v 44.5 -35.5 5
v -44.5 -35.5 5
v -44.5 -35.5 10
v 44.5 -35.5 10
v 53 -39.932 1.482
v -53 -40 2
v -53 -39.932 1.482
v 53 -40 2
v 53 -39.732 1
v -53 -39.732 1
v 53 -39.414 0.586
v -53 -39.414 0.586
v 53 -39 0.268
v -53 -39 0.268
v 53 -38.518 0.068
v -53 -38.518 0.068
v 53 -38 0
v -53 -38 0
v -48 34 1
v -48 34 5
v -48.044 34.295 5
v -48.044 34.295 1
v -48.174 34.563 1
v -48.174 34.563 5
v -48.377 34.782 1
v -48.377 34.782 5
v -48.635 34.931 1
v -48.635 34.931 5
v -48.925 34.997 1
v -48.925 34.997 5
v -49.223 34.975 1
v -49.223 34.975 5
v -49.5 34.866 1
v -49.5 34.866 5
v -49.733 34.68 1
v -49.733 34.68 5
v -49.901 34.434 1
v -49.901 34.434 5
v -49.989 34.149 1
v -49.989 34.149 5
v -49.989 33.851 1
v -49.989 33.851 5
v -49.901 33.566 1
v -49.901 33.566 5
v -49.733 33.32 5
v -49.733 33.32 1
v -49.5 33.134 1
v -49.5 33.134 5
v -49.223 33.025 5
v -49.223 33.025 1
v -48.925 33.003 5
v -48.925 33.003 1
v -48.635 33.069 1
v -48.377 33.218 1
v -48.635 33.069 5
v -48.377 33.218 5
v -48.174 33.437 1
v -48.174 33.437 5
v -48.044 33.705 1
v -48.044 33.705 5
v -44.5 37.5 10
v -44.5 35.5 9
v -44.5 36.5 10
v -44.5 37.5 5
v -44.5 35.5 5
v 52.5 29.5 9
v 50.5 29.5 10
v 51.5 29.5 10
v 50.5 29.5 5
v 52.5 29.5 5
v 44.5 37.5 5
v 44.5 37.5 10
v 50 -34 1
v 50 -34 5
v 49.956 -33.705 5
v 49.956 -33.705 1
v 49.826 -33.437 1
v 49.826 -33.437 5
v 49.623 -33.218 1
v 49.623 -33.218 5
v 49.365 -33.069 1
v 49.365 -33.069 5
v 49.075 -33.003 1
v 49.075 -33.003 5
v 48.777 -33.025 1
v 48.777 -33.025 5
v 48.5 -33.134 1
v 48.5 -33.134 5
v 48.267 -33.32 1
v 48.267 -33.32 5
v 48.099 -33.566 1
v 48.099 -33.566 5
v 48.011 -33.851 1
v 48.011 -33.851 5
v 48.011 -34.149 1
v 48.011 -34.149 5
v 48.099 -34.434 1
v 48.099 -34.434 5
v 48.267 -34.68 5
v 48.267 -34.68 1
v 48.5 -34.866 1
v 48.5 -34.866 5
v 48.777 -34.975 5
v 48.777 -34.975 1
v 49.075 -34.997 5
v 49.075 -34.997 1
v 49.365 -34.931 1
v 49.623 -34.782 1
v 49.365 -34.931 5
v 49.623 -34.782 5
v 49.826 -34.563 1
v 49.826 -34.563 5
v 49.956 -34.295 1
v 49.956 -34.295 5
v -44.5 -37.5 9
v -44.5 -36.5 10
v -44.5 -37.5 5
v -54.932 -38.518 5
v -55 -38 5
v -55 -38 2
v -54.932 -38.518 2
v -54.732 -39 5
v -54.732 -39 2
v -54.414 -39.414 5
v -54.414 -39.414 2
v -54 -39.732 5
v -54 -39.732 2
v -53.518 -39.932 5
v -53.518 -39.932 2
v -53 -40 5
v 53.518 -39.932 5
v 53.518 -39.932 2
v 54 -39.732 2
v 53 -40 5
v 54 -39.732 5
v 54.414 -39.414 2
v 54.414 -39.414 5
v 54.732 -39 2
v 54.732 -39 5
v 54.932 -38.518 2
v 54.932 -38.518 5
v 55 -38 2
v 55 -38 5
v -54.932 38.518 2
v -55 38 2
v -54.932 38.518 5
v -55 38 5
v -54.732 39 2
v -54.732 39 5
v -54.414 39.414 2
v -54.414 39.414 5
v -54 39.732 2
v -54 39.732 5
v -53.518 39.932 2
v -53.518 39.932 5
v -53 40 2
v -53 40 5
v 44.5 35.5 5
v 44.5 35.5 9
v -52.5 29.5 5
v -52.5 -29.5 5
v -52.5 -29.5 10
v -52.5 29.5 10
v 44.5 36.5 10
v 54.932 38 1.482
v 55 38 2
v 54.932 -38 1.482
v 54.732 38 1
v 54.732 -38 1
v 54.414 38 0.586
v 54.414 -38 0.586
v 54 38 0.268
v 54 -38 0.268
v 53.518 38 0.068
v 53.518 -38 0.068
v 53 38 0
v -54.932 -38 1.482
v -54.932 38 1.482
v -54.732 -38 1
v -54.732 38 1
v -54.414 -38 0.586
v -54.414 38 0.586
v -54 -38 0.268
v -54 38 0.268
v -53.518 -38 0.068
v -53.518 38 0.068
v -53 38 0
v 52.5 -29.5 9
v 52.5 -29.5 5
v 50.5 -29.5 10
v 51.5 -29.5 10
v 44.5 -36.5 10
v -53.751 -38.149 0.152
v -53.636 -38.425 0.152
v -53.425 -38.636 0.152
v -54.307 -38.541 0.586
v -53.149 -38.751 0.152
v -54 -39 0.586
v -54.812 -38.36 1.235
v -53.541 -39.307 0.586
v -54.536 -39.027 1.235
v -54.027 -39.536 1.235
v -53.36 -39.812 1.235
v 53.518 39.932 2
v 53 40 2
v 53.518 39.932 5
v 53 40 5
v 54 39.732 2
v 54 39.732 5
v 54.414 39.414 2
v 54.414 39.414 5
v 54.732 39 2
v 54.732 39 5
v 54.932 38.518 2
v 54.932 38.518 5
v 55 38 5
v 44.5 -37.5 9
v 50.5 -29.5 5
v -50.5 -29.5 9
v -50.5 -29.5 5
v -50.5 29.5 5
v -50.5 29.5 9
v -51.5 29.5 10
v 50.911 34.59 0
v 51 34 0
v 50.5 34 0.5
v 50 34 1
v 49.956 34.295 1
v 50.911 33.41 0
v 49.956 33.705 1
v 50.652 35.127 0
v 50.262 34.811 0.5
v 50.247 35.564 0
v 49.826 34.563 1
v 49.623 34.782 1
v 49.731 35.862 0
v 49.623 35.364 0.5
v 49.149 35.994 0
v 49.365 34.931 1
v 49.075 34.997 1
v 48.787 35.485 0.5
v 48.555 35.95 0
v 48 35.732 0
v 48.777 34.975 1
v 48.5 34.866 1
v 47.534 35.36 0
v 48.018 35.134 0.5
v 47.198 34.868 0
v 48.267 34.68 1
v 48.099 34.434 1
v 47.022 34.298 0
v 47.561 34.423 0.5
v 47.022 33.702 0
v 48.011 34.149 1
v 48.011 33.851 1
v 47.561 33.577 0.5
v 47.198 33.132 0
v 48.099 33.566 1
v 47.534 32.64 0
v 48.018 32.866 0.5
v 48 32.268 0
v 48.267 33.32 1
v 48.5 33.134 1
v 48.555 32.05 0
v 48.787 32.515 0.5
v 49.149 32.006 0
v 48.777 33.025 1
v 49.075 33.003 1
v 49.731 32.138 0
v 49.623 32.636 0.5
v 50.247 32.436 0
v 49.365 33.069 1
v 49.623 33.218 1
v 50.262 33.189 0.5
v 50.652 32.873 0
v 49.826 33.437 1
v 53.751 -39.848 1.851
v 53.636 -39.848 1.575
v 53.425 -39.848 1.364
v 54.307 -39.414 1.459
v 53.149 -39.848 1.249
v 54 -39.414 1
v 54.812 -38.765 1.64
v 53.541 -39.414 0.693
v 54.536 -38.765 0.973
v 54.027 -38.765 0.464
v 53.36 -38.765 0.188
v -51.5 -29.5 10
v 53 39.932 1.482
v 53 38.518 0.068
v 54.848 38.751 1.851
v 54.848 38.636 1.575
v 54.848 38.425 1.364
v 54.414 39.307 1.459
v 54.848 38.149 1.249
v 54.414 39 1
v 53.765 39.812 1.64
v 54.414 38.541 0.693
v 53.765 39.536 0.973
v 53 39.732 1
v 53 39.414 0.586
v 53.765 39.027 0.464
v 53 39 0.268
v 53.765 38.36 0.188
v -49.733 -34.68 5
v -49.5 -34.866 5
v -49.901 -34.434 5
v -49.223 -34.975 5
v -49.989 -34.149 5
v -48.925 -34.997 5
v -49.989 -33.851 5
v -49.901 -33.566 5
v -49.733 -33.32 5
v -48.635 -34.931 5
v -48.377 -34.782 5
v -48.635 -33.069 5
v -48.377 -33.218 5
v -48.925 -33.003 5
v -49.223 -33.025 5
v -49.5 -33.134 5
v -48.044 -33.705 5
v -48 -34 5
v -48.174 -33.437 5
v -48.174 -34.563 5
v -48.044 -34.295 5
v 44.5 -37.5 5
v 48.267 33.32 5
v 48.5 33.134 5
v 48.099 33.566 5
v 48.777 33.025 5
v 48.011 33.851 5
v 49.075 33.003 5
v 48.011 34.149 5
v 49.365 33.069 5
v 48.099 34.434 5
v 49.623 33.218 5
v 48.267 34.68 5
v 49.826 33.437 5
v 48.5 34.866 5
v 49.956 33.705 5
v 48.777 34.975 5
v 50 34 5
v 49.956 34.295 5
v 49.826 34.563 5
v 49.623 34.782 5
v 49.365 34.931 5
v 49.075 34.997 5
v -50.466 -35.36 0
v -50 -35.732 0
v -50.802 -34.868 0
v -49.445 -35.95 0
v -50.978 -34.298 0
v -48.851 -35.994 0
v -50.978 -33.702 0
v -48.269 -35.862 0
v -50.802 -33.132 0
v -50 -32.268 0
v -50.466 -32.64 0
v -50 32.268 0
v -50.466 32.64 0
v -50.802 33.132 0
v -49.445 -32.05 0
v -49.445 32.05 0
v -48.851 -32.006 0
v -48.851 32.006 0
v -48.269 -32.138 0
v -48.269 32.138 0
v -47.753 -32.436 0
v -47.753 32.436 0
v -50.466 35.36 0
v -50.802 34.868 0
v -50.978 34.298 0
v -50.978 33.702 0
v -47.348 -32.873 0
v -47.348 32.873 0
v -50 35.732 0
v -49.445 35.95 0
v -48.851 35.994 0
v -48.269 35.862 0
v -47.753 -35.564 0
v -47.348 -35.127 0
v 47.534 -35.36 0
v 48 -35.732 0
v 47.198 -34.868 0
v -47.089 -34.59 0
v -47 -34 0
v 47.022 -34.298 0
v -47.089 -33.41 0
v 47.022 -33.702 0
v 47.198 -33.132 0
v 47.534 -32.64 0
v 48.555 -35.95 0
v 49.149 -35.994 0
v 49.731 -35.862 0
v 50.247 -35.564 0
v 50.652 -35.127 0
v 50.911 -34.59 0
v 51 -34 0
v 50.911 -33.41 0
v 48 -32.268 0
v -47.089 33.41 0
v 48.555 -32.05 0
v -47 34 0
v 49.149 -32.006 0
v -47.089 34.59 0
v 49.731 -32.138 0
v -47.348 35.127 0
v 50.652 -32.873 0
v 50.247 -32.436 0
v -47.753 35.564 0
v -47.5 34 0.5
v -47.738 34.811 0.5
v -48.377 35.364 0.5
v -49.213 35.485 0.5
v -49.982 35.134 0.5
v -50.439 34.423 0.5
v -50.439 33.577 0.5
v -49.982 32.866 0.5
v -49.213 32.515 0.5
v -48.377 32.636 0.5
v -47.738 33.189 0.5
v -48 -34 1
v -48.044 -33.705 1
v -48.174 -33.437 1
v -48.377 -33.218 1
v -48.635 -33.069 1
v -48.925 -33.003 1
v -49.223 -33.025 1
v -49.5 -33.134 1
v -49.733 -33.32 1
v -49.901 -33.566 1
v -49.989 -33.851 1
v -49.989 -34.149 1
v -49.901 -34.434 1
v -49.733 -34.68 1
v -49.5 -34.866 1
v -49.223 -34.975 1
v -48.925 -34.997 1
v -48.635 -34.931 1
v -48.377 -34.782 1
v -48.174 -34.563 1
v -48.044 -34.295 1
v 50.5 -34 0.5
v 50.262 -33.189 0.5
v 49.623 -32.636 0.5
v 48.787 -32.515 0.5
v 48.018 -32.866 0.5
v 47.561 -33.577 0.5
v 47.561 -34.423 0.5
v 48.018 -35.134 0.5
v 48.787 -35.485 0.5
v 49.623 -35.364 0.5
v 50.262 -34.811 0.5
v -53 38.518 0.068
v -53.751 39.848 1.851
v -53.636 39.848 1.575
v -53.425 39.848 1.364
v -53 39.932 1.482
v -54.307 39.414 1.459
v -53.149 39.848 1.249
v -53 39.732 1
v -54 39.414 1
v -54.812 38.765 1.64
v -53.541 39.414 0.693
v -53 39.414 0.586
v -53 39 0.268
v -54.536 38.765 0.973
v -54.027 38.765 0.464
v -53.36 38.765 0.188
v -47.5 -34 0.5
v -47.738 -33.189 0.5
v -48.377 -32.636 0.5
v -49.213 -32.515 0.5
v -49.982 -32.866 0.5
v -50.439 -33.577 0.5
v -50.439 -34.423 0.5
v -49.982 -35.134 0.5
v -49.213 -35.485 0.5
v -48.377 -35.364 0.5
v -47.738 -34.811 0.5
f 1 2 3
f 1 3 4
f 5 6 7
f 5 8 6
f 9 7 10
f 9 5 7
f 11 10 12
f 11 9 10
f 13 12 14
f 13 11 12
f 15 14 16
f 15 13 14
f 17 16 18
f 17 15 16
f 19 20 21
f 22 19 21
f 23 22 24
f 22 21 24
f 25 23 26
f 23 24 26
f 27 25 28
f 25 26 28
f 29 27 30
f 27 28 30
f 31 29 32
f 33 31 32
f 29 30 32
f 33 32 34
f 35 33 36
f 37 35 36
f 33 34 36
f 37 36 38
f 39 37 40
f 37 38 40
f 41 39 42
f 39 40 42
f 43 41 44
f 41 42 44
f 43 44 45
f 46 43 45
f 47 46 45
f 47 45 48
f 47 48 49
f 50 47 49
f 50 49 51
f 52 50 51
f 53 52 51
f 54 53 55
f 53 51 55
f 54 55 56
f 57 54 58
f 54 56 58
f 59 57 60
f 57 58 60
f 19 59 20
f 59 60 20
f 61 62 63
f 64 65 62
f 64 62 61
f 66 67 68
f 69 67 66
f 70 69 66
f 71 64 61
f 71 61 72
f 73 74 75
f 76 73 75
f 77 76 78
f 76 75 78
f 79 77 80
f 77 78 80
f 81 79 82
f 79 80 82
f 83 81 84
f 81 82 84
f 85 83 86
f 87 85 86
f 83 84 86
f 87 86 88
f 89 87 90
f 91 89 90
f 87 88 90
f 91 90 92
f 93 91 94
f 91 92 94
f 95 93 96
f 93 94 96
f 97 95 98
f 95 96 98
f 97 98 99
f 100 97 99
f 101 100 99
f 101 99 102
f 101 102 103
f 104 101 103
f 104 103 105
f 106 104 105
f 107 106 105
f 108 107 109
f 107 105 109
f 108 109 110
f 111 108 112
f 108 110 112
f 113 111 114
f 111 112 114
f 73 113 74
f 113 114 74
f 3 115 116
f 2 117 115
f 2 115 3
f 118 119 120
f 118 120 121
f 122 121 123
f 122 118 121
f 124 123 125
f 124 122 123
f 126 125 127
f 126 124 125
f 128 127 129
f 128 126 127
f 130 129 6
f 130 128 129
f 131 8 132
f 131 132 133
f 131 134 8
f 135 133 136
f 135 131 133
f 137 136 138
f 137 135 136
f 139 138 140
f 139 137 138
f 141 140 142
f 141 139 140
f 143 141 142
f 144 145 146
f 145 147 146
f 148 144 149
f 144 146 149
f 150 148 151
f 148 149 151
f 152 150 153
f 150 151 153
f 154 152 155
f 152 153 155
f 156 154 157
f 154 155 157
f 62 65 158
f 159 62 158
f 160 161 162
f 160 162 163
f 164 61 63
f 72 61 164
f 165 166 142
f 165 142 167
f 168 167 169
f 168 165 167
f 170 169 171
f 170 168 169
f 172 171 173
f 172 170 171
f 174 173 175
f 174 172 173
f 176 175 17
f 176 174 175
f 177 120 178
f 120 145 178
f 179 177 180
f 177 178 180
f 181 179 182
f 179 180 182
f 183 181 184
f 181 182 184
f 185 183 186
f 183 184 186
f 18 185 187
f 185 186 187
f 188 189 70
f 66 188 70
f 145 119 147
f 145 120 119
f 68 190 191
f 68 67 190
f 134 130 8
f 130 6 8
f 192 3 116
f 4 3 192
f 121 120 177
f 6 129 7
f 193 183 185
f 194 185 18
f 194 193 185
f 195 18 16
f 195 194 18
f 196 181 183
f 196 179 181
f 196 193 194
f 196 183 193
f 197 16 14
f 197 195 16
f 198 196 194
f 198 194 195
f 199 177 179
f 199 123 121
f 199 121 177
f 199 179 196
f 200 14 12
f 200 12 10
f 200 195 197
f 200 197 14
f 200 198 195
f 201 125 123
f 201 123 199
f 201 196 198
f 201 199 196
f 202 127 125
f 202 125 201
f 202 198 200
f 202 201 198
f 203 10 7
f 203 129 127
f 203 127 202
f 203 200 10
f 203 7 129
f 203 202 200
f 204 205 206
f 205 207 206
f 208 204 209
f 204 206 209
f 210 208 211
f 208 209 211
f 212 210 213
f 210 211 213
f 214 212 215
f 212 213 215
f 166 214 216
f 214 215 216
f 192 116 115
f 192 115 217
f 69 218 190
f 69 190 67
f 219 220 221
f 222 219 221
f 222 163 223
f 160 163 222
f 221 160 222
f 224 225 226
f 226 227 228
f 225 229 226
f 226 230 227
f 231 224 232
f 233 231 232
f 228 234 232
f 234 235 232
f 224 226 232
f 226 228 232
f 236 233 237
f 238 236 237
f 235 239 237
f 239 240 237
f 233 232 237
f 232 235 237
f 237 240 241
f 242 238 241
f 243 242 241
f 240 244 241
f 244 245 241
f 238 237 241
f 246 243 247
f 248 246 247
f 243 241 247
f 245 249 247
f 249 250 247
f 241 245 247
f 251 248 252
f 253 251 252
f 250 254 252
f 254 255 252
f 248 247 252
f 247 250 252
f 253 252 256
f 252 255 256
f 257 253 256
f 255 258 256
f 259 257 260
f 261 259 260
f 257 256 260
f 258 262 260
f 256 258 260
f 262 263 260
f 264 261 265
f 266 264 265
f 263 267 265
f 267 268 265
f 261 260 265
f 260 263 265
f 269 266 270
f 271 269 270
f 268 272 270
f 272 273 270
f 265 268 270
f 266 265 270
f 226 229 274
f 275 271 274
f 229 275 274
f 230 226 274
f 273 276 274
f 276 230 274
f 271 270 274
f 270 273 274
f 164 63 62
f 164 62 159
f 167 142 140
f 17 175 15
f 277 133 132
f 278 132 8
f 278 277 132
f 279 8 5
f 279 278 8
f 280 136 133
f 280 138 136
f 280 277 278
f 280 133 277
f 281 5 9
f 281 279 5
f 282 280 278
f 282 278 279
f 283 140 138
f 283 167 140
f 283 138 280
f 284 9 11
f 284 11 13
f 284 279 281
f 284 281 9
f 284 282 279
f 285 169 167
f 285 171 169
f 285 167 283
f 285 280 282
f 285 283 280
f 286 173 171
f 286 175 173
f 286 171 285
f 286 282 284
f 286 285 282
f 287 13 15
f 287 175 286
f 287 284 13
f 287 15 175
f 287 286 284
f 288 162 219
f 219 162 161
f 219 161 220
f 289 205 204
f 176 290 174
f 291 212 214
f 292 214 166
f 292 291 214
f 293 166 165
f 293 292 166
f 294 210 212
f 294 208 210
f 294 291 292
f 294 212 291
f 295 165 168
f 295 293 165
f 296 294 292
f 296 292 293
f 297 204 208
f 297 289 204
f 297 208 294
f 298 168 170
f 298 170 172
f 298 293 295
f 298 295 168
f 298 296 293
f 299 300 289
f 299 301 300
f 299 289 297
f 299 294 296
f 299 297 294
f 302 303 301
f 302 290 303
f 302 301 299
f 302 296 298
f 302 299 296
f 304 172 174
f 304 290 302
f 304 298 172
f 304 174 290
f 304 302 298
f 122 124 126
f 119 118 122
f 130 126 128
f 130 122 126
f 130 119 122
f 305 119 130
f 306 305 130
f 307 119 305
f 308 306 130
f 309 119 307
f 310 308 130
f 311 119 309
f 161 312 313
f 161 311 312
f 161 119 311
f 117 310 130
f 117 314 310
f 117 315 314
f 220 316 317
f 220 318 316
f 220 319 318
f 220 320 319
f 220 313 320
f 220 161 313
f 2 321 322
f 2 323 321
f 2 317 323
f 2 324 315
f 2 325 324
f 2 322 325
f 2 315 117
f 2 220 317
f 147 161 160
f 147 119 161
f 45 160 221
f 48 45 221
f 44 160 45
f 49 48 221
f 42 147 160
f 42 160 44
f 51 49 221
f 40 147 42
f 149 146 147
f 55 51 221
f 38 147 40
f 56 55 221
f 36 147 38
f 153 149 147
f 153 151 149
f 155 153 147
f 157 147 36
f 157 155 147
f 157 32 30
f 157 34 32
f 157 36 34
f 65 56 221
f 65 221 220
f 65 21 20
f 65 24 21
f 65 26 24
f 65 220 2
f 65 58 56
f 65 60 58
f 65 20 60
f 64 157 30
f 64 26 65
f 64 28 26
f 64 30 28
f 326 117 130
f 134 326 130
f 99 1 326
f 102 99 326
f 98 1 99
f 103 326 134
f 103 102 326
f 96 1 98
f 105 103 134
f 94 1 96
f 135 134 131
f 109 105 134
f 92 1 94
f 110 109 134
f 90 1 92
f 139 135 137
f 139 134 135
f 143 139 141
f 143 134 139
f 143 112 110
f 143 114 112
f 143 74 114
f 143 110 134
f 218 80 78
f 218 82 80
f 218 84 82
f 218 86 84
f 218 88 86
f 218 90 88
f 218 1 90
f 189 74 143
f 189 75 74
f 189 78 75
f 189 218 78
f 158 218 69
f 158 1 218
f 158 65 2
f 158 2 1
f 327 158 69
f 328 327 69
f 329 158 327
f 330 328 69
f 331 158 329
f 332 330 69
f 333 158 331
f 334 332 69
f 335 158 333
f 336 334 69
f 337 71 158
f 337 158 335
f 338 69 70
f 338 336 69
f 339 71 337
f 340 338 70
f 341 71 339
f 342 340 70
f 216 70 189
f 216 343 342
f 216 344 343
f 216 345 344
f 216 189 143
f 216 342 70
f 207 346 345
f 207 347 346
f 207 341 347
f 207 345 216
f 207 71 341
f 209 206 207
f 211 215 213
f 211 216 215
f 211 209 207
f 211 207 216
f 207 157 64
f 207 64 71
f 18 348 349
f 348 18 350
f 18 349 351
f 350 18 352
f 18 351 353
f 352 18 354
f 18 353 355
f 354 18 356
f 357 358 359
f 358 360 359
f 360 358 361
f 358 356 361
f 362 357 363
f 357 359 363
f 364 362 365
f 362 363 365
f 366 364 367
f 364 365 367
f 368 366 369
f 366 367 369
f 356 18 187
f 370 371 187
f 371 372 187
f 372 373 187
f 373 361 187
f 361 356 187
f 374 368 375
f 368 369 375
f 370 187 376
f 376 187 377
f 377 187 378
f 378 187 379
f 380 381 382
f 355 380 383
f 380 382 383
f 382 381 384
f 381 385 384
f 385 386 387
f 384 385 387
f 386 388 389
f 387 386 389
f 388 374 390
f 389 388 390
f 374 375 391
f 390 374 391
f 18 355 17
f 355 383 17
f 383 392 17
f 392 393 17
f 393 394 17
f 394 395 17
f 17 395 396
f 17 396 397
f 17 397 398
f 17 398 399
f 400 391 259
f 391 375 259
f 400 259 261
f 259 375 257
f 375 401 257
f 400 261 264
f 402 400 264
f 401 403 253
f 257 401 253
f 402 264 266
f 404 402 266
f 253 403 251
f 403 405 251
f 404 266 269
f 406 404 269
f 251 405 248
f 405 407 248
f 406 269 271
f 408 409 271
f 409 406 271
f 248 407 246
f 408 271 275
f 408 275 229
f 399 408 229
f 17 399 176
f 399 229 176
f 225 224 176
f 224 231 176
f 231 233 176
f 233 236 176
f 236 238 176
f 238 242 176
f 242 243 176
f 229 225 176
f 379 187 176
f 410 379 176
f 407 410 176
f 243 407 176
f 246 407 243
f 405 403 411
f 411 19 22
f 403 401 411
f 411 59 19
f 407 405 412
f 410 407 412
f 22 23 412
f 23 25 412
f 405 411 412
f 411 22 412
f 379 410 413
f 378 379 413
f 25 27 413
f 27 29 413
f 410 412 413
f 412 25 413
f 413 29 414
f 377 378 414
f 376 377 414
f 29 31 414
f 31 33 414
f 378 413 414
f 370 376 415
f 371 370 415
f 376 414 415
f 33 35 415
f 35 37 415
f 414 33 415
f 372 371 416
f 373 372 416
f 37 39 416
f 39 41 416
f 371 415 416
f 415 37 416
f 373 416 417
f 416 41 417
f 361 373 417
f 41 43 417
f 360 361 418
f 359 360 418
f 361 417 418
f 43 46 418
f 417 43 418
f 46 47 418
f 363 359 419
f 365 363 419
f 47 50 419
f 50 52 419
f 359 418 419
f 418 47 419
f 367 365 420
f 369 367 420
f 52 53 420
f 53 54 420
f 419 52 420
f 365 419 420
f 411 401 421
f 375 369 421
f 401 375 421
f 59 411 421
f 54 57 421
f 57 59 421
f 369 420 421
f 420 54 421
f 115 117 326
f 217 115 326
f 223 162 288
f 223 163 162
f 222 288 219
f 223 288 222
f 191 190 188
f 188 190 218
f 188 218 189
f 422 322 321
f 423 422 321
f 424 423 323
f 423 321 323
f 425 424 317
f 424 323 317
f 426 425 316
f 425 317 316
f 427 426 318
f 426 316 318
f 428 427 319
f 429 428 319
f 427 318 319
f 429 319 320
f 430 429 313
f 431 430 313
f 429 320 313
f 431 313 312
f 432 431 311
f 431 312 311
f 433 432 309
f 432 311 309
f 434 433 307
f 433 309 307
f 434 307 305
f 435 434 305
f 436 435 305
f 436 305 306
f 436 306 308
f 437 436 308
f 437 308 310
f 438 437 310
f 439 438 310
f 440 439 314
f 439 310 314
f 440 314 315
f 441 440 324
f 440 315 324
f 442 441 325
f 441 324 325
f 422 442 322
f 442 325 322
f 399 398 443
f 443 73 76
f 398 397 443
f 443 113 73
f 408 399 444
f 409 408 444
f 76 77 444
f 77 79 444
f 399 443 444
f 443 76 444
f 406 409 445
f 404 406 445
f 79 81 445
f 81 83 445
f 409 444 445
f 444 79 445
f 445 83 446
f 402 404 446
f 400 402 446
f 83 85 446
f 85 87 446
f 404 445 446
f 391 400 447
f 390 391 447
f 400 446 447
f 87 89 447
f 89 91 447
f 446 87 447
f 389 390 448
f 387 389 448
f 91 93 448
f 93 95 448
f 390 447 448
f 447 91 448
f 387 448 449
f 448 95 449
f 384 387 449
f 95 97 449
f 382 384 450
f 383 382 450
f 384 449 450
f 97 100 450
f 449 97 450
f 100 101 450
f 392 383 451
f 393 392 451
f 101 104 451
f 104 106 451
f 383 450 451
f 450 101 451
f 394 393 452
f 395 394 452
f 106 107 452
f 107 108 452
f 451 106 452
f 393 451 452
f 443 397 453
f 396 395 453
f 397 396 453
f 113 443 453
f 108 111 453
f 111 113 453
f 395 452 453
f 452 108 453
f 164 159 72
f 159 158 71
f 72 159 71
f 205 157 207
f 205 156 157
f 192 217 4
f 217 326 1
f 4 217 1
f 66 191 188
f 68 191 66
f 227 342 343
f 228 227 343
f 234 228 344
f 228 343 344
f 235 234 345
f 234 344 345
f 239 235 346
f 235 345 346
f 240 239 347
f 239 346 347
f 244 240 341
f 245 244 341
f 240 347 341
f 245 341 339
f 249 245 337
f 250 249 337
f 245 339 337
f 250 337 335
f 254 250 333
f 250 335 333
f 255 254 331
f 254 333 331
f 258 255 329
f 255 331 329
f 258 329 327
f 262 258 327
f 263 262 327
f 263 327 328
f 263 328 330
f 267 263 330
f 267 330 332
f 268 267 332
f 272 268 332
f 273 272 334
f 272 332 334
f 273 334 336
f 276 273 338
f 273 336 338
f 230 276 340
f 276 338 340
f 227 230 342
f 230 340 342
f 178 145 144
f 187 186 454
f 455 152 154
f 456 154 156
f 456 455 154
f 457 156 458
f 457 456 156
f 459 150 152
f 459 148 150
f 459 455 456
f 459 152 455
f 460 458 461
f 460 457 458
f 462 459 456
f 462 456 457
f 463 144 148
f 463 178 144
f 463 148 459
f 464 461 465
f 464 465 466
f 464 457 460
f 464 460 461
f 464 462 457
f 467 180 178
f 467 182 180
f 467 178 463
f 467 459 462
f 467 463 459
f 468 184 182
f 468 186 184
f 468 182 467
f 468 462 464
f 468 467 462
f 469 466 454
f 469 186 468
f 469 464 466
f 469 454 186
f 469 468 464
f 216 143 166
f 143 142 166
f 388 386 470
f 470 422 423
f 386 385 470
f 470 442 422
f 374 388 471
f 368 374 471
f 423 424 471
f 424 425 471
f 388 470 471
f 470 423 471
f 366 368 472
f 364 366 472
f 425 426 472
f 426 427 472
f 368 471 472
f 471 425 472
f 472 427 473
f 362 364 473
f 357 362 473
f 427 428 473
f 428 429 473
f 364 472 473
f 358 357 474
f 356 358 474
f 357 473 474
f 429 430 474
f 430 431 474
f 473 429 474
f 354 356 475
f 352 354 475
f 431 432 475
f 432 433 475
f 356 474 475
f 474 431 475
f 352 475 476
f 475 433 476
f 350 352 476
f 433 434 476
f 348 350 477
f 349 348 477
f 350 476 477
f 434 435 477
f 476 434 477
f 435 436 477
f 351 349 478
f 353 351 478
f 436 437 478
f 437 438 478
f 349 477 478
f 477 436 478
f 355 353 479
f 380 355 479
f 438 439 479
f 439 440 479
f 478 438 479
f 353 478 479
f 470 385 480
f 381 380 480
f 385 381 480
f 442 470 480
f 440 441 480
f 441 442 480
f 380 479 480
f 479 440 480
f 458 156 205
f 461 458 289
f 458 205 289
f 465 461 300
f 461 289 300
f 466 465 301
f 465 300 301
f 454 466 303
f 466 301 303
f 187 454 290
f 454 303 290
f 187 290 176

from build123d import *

# Parameters (mm, degrees)
SKETCH_W        = 110
SKETCH_H        = 80
PAD_DEPTH       = 5
SKETCH001_R     = 1
POCKET_DEPTH    = 5
CHAMFER_SIZE    = 1
SKETCH002_W     = 89
SKETCH002_H     = 2
SKETCH002_W_2   = 2
SKETCH002_H_2   = 59
PAD001_DEPTH    = 5
CHAMFER001_SIZE = 1
FILLET_R        = 2


with BuildPart() as part:
    # Sketch → Pad (new body)
    with BuildSketch(Plane.XY):
        Rectangle(SKETCH_W, SKETCH_H)
    extrude(amount=PAD_DEPTH)

    # Sketch001 (on Face6 of Pad) → Pocket (cut)
    with BuildSketch(Plane.XY.offset(5)):
        with Locations((49, 34)):
            Circle(SKETCH001_R)
        with Locations((-49, 34)):
            Circle(SKETCH001_R)
        with Locations((-49, -34)):
            Circle(SKETCH001_R)
        with Locations((49, -34)):
            Circle(SKETCH001_R)
    extrude(amount=-POCKET_DEPTH, mode=Mode.SUBTRACT)

    # Chamfer
    chamfer_edges = [part.edges().sort_by_distance(p)[0] for p in [
        (-50, -34, 0),
        (-50, 34, 0),
        (48, 34, 0),
        (48, -34, 0),
    ]]
    chamfer(chamfer_edges, length=CHAMFER_SIZE)

    # Sketch002 (on Face11 of Chamfer) → Pad001 (join)
    with BuildSketch(Plane.XY.offset(5)):
        with Locations((0, 36.5)):
            Rectangle(SKETCH002_W, SKETCH002_H)
        with Locations((0, -36.5)):
            Rectangle(SKETCH002_W, SKETCH002_H)
        with Locations((51.5, 0)):
            Rectangle(SKETCH002_W_2, SKETCH002_H_2)
        with Locations((-51.5, 0)):
            Rectangle(SKETCH002_W_2, SKETCH002_H_2)
    extrude(amount=PAD001_DEPTH)

    # Chamfer001
    chamfer001_edges = [part.edges().sort_by_distance(p)[0] for p in [
        (0, 35.5, 10),
        (52.5, 0, 10),
        (-50.5, 0, 10),
        (0, -37.5, 10),
    ]]
    chamfer(chamfer001_edges, length=CHAMFER001_SIZE)

    # Fillet
    fillet_edges = [part.edges().sort_by_distance(p)[0] for p in [
        (-55, -40, 2.5),
        (-55, 0, 0),
        (-55, 40, 2.5),
        (0, 40, 0),
        (55, 40, 2.5),
        (55, 0, 0),
        (55, -40, 2.5),
        (0, -40, 0),
    ]]
    fillet(fillet_edges, radius=FILLET_R)


solid = part.part
